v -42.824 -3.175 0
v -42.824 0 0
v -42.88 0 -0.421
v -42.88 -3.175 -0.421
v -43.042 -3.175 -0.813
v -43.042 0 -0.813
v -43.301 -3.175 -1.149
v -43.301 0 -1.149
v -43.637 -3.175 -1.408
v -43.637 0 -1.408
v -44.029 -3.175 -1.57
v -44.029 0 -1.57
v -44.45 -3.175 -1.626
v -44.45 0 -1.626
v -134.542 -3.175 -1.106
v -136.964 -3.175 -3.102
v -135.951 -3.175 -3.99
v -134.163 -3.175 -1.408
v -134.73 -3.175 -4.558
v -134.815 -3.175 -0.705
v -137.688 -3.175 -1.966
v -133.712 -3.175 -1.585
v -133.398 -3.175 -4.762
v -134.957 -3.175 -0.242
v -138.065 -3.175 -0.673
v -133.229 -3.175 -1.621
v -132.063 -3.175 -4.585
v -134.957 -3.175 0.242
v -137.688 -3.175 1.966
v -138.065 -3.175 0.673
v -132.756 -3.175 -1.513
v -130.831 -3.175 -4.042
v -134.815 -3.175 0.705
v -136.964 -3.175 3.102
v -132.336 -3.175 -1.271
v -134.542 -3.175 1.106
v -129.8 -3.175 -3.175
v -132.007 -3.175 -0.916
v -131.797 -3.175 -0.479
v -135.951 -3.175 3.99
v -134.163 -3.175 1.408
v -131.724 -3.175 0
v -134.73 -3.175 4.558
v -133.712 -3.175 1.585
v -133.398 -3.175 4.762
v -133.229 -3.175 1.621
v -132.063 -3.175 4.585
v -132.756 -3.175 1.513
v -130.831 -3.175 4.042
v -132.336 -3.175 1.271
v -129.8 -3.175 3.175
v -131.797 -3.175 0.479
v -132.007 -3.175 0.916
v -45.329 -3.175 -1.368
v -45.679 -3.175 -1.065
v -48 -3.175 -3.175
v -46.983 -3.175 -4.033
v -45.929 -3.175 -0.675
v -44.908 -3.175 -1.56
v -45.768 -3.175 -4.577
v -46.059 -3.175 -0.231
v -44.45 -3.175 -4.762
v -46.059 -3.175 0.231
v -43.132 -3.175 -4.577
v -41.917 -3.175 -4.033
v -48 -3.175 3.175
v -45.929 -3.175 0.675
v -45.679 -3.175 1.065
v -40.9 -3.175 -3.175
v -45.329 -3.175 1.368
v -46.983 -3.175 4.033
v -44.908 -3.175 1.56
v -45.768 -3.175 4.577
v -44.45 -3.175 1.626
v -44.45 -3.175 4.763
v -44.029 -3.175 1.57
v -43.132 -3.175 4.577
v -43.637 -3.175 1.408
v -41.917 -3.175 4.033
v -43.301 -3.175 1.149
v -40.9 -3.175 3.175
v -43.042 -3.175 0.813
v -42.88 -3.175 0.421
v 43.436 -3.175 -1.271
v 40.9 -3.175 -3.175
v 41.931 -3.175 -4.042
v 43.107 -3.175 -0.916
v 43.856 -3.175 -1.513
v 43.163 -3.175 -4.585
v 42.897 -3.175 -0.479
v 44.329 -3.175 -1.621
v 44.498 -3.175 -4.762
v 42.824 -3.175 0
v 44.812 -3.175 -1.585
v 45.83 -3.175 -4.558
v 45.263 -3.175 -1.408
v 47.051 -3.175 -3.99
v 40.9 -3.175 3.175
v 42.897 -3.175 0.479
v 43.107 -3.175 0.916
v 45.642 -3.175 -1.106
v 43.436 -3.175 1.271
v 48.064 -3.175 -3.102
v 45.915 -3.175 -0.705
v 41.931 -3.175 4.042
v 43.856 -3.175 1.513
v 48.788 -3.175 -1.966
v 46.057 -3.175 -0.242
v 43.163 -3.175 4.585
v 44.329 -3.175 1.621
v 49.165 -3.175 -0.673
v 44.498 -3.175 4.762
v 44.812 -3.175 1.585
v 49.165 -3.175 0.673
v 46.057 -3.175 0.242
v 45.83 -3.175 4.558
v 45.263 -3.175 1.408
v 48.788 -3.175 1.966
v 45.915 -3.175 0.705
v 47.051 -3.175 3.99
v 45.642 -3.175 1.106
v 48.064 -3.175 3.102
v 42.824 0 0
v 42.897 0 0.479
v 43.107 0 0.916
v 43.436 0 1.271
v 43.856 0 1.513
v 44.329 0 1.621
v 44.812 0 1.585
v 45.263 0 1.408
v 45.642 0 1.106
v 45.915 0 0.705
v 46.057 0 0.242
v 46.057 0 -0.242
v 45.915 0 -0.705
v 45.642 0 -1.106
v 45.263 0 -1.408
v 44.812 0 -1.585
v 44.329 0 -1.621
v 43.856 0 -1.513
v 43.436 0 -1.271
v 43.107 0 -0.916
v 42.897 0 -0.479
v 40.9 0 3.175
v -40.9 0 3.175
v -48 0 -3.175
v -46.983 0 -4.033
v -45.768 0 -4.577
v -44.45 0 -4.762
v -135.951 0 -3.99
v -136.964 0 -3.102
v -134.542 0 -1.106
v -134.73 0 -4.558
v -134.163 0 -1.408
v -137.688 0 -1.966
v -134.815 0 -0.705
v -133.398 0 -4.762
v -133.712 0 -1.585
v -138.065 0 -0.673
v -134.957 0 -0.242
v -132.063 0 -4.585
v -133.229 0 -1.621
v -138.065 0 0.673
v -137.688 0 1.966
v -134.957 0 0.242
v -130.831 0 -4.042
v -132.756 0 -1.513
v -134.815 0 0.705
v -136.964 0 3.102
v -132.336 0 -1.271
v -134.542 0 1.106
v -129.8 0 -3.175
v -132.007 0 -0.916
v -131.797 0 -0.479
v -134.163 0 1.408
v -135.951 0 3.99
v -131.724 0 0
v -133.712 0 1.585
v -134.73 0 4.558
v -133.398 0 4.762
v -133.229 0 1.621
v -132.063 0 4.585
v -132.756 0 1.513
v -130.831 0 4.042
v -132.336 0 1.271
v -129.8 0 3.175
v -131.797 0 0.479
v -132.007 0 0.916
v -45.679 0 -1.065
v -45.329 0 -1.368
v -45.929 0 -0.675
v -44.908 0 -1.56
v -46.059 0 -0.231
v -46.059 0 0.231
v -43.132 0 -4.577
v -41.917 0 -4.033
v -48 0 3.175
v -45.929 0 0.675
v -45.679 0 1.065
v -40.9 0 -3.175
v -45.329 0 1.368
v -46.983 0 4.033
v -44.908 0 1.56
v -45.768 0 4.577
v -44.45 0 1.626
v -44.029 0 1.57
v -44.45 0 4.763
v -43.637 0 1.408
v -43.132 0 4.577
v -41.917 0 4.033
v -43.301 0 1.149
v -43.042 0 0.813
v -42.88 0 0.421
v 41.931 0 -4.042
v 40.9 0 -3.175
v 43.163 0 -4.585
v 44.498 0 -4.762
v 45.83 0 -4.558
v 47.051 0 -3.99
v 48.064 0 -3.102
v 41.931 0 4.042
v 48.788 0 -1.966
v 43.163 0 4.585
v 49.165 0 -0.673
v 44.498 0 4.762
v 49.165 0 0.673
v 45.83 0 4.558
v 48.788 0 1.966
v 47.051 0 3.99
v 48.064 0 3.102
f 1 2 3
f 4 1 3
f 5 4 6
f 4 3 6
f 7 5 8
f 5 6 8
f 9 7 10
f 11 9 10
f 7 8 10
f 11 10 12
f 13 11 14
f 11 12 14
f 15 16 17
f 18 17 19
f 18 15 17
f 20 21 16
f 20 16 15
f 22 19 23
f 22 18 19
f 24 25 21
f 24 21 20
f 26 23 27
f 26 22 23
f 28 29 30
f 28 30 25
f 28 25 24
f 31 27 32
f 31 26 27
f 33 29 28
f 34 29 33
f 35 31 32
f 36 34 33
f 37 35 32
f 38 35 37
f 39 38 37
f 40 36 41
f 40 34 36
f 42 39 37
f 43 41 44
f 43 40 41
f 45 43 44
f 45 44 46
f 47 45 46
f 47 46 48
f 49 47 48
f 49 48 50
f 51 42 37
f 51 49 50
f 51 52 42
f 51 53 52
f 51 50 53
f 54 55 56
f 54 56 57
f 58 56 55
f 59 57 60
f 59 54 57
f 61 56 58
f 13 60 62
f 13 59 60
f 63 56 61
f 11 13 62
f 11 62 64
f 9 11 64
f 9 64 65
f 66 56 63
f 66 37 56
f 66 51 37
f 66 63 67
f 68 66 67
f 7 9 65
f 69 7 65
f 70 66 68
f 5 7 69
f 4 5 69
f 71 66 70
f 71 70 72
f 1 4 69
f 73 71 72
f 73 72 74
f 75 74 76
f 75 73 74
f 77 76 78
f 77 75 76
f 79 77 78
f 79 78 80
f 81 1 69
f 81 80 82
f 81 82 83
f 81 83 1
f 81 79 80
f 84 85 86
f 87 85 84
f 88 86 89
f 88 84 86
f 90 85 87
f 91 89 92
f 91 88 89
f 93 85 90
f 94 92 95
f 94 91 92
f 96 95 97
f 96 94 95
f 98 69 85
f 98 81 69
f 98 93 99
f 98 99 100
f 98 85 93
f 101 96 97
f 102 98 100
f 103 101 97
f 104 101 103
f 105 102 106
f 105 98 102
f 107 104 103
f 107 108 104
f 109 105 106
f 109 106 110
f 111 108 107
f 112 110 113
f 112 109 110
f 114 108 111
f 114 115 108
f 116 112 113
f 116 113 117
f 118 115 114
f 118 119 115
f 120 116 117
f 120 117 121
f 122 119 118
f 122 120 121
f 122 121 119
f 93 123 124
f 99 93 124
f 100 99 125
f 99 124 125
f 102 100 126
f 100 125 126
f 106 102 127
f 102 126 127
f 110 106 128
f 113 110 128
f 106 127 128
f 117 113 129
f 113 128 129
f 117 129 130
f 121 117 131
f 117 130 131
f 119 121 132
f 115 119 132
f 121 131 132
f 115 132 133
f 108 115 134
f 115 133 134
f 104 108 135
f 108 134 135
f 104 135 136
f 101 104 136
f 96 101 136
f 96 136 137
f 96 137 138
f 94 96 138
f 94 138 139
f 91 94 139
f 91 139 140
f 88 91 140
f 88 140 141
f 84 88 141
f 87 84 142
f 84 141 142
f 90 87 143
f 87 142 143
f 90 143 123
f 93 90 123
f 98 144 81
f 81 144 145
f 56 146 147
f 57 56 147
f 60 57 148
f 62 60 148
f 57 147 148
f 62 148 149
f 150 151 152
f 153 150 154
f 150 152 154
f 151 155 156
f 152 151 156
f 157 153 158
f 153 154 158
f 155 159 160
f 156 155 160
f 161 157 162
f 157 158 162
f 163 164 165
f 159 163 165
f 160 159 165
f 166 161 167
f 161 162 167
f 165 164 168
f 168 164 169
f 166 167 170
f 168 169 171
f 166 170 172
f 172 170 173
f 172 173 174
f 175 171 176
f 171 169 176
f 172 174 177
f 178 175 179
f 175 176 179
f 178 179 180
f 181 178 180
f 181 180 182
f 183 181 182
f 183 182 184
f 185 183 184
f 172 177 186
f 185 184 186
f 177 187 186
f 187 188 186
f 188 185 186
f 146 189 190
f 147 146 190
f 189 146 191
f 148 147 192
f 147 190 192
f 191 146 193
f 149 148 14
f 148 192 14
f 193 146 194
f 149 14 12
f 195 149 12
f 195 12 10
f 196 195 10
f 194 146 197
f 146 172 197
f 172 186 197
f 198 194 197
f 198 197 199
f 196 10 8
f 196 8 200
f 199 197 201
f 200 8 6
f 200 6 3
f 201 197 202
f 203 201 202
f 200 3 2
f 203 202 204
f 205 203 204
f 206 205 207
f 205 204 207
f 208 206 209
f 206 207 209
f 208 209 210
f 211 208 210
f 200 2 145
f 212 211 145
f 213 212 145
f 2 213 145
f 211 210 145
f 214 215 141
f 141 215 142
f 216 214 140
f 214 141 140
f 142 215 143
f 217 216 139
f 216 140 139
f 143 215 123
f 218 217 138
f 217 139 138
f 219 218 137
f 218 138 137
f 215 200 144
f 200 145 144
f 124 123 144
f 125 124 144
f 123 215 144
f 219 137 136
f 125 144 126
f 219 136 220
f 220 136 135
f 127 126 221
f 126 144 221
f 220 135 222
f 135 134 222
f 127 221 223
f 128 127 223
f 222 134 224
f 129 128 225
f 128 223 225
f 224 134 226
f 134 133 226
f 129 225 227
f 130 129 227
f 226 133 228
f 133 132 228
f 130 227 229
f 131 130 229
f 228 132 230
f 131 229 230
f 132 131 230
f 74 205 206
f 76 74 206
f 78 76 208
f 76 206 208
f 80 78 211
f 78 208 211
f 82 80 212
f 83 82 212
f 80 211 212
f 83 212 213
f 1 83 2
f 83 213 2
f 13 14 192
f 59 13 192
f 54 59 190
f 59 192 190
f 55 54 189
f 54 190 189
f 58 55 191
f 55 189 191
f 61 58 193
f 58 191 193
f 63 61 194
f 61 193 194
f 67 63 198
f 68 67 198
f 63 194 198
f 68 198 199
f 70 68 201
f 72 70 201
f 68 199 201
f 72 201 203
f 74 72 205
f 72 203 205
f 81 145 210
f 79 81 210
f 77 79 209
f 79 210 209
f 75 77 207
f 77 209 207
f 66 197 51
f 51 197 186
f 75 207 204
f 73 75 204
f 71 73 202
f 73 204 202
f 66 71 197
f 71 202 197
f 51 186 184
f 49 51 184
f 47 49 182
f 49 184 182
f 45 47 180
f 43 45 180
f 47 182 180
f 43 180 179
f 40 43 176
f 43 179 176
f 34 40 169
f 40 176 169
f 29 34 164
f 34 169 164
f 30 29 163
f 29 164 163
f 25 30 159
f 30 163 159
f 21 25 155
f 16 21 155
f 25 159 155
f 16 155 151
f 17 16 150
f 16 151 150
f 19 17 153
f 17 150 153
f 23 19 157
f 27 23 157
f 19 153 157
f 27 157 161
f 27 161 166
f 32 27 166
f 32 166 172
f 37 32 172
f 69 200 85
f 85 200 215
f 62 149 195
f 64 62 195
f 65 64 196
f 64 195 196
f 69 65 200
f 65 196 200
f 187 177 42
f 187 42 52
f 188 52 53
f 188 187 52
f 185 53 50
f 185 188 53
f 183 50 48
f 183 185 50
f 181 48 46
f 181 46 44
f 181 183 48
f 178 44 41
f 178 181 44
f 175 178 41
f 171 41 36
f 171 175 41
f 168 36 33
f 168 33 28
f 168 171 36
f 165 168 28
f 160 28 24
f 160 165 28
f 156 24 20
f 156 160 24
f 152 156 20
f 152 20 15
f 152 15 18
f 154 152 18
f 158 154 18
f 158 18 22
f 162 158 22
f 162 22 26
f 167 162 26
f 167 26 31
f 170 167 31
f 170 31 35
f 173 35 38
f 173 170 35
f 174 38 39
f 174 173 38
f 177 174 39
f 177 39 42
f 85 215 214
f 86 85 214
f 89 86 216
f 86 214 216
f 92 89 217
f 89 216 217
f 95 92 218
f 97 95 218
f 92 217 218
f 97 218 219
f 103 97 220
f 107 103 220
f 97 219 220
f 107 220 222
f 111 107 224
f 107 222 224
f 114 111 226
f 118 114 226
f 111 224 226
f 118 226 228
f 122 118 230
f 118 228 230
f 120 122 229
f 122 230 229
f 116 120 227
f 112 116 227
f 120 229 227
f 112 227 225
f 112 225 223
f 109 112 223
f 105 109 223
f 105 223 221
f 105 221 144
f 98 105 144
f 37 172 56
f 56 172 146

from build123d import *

# Parameters (mm, degrees)
F0_R     = 1.6256
F1_DEPTH = 3.175


with BuildPart() as f1:
    # F0 (on Front) → F1 (new body)
    with BuildSketch(Plane.XZ):
        with BuildLine():
            Line((0, -3.175), (0, 0))
            Line((0, 0), (0, 3.175))
            Line((0, 3.175), (-40.900242, 3.175))
            ThreePointArc((-40.900242, 3.175), (-42.505718, 4.347548), (-44.45, 4.7625))
            Line((-44.45, 4.7625), (-44.45, 1.6256))
            ThreePointArc((-44.45, 1.6256), (-43.300527, 1.149473), (-42.8244, 0))
            ThreePointArc((-42.8244, 0), (-43.300527, -1.149473), (-44.45, -1.6256))
            Line((-44.45, -1.6256), (-44.45, -4.7625))
            ThreePointArc((-44.45, -4.7625), (-42.505718, -4.347548), (-40.900242, -3.175))
            Line((-40.900242, -3.175), (0, -3.175))
        make_face()
        with BuildLine():
            Line((0, 3.175), (0, 0))
            Line((0, 0), (0, -3.175))
            Line((0, -3.175), (40.900242, -3.175))
            ThreePointArc((40.900242, -3.175), (49.2125, 0), (40.900242, 3.175))
            Line((40.900242, 3.175), (0, 3.175))
        make_face()
        with BuildLine():
            ThreePointArc((46.0756, 0), (44.45, -1.6256), (42.8244, 0))
            ThreePointArc((42.8244, 0), (44.45, 1.6256), (46.0756, 0))
        make_face(mode=Mode.SUBTRACT)
        with BuildLine():
            ThreePointArc((-47.999758, -3.175), (-49.2125, 0), (-47.999758, 3.175))
            Line((-47.999758, 3.175), (-88.9, 3.175))
            Line((-88.9, 3.175), (-129.800242, 3.175))
            ThreePointArc((-129.800242, 3.175), (-138.1125, 0), (-129.800242, -3.175))
            Line((-129.800242, -3.175), (-88.9, -3.175))
            Line((-88.9, -3.175), (-47.999758, -3.175))
        make_face()
        with Locations((-133.35, 0)):
            Circle(F0_R, mode=Mode.SUBTRACT)
        with BuildLine():
            Line((-44.45, 1.6256), (-44.45, 4.7625))
            ThreePointArc((-44.45, 4.7625), (-46.394282, 4.347548), (-47.999758, 3.175))
            ThreePointArc((-47.999758, 3.175), (-49.2125, 0), (-47.999758, -3.175))
            ThreePointArc((-47.999758, -3.175), (-46.394282, -4.347548), (-44.45, -4.7625))
            Line((-44.45, -4.7625), (-44.45, -1.6256))
            ThreePointArc((-44.45, -1.6256), (-46.0756, 0), (-44.45, 1.6256))
        make_face()
    extrude(amount=F1_DEPTH)


solid = f1.part
